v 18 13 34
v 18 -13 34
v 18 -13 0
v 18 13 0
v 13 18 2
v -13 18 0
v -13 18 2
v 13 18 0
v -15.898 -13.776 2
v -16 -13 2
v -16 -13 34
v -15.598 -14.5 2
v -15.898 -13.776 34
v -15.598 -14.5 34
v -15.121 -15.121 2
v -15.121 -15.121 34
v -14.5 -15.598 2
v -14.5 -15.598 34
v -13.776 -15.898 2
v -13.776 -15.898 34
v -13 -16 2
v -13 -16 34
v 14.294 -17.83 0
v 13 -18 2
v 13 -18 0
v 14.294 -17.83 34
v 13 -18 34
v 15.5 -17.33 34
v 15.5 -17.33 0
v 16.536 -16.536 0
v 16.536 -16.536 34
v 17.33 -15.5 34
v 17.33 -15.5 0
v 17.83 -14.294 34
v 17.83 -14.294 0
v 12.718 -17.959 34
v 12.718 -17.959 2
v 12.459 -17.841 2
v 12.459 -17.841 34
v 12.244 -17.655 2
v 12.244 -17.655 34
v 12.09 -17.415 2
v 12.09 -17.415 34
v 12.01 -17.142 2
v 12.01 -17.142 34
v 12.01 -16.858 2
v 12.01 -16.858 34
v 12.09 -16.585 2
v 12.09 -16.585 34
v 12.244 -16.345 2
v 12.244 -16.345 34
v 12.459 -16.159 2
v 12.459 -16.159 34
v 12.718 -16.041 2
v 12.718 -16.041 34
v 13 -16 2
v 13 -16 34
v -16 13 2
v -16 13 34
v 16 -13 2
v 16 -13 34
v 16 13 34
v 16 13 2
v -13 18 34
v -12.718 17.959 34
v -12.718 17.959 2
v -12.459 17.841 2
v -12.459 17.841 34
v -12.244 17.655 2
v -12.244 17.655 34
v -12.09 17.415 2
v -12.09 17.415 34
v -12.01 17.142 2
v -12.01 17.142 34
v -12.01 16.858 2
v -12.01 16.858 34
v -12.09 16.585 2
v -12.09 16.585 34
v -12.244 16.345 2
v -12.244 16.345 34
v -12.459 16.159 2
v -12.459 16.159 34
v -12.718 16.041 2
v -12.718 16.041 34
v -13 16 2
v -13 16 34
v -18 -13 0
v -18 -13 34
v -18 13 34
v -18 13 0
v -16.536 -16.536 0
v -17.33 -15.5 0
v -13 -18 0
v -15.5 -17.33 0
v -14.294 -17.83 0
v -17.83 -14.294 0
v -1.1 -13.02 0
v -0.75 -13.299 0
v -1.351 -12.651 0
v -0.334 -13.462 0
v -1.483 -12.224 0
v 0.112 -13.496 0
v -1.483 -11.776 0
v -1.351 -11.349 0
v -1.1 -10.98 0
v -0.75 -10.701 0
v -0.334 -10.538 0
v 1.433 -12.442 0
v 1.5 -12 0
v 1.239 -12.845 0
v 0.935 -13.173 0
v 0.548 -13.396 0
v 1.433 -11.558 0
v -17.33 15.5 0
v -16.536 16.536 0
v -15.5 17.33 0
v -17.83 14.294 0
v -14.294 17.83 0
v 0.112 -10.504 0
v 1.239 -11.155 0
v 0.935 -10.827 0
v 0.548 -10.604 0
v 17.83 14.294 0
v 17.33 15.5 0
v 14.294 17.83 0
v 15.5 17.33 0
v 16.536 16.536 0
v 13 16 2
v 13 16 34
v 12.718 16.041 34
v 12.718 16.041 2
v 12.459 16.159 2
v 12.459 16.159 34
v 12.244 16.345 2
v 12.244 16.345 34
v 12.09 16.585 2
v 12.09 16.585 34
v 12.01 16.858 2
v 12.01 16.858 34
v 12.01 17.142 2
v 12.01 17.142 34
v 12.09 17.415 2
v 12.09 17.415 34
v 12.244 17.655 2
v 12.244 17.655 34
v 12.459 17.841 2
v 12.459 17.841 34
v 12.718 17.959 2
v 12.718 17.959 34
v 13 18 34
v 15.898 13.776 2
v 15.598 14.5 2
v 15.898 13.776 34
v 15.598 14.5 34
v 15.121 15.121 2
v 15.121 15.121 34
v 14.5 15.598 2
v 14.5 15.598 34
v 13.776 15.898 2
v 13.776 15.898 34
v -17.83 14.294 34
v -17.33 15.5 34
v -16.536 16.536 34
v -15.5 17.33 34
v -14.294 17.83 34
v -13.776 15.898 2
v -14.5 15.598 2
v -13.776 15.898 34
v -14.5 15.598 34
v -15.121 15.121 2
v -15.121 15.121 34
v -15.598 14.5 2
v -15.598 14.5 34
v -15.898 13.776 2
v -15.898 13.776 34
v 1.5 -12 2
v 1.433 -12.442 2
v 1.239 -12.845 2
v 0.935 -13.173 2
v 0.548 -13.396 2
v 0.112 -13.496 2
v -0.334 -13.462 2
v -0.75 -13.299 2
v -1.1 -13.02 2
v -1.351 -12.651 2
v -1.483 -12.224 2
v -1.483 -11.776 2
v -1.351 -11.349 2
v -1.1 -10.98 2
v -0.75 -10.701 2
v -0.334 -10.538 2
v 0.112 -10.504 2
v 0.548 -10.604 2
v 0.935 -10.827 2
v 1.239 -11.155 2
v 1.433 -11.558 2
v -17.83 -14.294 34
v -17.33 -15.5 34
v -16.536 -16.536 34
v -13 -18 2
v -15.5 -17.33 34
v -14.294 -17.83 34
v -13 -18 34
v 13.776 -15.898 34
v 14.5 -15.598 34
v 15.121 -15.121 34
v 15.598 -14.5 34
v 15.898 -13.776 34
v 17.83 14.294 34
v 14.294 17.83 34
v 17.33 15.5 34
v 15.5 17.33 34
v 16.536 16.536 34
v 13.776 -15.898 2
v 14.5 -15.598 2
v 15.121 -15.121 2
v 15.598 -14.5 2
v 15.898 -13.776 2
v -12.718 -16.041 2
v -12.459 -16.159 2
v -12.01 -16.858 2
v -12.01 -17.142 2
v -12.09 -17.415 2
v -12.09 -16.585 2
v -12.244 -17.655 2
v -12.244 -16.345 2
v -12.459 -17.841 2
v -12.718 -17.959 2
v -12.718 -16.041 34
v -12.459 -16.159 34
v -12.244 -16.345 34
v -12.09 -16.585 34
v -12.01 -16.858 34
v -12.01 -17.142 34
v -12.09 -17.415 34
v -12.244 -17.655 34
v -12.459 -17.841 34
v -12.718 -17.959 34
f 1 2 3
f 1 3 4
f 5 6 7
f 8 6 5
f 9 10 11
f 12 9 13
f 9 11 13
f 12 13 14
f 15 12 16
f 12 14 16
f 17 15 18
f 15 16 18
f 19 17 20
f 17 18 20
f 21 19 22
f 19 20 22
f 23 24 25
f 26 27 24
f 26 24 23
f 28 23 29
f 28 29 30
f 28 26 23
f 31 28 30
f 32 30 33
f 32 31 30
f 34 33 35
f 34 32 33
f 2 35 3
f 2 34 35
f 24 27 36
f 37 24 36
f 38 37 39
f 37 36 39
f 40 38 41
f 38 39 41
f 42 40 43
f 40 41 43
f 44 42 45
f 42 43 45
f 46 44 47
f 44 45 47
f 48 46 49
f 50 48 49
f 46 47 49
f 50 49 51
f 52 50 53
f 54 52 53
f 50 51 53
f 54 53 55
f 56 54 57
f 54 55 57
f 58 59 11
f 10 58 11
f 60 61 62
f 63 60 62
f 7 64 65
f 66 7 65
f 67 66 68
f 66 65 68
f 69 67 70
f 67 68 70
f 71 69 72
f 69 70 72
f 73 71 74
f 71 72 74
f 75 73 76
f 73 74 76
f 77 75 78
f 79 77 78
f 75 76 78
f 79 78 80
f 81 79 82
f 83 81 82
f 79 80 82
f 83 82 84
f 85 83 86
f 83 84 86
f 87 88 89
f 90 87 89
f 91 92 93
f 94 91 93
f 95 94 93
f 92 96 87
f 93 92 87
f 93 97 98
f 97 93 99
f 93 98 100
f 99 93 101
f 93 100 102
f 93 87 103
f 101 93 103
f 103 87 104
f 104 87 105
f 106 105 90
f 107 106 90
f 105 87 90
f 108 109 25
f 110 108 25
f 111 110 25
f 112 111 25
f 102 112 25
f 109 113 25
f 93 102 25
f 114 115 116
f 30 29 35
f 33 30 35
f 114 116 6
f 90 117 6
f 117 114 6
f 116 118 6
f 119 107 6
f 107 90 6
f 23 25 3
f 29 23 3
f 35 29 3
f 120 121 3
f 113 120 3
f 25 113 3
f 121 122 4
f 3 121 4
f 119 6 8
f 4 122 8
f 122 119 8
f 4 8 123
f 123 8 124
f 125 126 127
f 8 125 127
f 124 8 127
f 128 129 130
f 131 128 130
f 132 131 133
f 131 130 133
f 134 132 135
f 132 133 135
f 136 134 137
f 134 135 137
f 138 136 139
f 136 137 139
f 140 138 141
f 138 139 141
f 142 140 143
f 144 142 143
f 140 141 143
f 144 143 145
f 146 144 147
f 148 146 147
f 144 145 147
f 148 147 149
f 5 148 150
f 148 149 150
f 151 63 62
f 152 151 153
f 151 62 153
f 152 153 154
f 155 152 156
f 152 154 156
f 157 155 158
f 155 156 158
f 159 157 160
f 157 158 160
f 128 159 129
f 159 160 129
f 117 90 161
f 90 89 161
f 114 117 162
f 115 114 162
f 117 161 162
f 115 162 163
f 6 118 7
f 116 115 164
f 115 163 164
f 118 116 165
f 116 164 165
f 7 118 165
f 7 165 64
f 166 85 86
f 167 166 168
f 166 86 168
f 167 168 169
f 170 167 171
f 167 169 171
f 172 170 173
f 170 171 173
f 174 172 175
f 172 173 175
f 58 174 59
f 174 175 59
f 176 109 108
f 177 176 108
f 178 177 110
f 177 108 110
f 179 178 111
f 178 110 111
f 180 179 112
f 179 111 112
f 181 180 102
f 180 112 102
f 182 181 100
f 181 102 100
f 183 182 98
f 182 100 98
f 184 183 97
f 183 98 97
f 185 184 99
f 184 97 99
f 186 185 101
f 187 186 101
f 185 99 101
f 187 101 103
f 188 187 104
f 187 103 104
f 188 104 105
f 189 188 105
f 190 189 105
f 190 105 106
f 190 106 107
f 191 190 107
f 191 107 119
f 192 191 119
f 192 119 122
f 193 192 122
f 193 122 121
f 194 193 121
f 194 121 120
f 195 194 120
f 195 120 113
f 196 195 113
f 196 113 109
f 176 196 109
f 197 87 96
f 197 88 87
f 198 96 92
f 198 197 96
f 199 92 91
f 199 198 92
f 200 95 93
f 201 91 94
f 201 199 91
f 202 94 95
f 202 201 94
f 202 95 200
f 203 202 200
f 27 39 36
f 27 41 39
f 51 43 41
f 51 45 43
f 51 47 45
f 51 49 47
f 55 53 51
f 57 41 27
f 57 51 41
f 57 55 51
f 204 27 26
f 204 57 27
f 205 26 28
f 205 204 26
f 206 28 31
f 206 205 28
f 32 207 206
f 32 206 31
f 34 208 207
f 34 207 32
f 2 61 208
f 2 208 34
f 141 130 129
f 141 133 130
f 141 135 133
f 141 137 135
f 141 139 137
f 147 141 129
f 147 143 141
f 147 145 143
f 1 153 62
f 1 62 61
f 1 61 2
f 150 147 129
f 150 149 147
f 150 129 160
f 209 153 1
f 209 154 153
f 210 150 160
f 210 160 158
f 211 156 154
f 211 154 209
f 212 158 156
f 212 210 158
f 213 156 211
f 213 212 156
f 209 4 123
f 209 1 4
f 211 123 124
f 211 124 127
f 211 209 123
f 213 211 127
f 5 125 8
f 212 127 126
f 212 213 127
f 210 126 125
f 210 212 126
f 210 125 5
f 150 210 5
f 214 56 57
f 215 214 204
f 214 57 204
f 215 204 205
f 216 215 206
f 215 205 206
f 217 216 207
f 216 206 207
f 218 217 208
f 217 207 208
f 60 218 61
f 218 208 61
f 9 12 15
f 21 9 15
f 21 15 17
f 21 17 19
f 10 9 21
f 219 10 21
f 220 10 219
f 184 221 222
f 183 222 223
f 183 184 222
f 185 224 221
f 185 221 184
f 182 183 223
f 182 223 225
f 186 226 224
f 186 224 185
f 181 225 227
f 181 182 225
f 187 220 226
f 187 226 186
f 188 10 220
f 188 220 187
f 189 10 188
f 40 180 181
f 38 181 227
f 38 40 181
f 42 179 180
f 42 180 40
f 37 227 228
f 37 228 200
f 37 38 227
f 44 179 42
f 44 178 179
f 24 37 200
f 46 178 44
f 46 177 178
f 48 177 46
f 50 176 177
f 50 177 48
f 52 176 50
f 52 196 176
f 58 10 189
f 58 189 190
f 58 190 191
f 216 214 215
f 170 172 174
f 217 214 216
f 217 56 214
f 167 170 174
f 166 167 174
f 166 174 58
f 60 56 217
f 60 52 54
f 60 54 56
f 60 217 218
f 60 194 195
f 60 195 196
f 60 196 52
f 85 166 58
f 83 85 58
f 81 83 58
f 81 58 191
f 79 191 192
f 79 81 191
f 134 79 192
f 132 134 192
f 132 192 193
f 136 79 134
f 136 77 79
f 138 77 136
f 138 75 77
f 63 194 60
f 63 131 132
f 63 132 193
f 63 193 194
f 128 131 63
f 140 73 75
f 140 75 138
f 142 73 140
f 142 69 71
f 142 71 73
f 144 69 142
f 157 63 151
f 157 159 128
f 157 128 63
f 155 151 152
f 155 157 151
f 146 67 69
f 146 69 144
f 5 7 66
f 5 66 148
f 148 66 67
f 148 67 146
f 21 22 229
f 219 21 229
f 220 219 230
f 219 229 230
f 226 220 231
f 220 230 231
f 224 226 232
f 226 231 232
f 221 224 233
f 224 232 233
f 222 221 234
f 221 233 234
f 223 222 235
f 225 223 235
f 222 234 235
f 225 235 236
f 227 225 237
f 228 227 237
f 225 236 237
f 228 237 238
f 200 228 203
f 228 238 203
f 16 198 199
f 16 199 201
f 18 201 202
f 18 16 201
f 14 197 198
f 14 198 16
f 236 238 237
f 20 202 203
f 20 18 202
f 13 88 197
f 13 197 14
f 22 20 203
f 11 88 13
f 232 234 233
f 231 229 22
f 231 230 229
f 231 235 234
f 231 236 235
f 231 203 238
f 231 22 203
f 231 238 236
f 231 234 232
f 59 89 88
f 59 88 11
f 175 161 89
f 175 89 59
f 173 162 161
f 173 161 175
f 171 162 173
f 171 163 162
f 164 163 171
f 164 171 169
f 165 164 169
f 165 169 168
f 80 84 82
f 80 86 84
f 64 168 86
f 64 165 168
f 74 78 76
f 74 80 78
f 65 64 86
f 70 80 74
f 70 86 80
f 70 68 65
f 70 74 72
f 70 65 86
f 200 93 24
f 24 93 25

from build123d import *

# Parameters (mm, degrees)
F0_W     = 36
F0_H     = 36
F1_DEPTH = 34
F2_R     = 5
F4_DEPTH = 32
F5_R     = 1.5
F6_DEPTH = 25
F8_DEPTH = 32


with BuildPart() as f1:
    # F0 (on Top) → F1 (new body)
    with BuildSketch(Plane.XY):
        Rectangle(F0_W, F0_H)
    extrude(amount=F1_DEPTH)

    # F2
    f2_edges = [f1.edges().sort_by_distance(p)[0] for p in [
        (18, 18, 17),
        (-18, 18, 17),
        (18, -18, 17),
        (-18, -18, 17),
    ]]
    fillet(f2_edges, radius=F2_R)

    # F3 (on face) → F4 (cut)
    with BuildSketch(Plane.XY.offset(34)):
        with BuildLine():
            ThreePointArc((-13, 18), (-12, 17), (-13, 16))
            ThreePointArc((-13, 16), (-15.1213203436, 15.1213203436), (-16, 13))
            Line((-16, 13), (-16, -13))
            ThreePointArc((-16, -13), (-15.1213203436, -15.1213203436), (-13, -16))
            Line((-13, -16), (13, -16))
            ThreePointArc((13, -16), (15.1213203436, -15.1213203436), (16, -13))
            Line((16, -13), (16, 13))
            ThreePointArc((16, 13), (15.1213203436, 15.1213203436), (13, 16))
            ThreePointArc((13, 16), (12, 17), (13, 18))
            Line((13, 18), (-13, 18))
        make_face()
    extrude(amount=-F4_DEPTH, mode=Mode.SUBTRACT)

    # F5 (on face) → F6 (cut)
    with BuildSketch(Plane(origin=(0, 0, 0), x_dir=(1, 0, 0), z_dir=(0, 0, -1))):
        with Locations((0, 12)):
            Circle(F5_R)
    extrude(amount=-F6_DEPTH, mode=Mode.SUBTRACT)

    # F7 (on face) → F8 (cut, through all)
    with BuildSketch(Plane.XY.offset(34)):
        with BuildLine():
            ThreePointArc((-13, -16), (-12, -17), (-13, -18))
            Line((-13, -18), (13, -18))
            ThreePointArc((13, -18), (12, -17), (13, -16))
            Line((13, -16), (-13, -16))
        make_face()
    extrude(amount=-F8_DEPTH, mode=Mode.SUBTRACT)


solid = f1.part
